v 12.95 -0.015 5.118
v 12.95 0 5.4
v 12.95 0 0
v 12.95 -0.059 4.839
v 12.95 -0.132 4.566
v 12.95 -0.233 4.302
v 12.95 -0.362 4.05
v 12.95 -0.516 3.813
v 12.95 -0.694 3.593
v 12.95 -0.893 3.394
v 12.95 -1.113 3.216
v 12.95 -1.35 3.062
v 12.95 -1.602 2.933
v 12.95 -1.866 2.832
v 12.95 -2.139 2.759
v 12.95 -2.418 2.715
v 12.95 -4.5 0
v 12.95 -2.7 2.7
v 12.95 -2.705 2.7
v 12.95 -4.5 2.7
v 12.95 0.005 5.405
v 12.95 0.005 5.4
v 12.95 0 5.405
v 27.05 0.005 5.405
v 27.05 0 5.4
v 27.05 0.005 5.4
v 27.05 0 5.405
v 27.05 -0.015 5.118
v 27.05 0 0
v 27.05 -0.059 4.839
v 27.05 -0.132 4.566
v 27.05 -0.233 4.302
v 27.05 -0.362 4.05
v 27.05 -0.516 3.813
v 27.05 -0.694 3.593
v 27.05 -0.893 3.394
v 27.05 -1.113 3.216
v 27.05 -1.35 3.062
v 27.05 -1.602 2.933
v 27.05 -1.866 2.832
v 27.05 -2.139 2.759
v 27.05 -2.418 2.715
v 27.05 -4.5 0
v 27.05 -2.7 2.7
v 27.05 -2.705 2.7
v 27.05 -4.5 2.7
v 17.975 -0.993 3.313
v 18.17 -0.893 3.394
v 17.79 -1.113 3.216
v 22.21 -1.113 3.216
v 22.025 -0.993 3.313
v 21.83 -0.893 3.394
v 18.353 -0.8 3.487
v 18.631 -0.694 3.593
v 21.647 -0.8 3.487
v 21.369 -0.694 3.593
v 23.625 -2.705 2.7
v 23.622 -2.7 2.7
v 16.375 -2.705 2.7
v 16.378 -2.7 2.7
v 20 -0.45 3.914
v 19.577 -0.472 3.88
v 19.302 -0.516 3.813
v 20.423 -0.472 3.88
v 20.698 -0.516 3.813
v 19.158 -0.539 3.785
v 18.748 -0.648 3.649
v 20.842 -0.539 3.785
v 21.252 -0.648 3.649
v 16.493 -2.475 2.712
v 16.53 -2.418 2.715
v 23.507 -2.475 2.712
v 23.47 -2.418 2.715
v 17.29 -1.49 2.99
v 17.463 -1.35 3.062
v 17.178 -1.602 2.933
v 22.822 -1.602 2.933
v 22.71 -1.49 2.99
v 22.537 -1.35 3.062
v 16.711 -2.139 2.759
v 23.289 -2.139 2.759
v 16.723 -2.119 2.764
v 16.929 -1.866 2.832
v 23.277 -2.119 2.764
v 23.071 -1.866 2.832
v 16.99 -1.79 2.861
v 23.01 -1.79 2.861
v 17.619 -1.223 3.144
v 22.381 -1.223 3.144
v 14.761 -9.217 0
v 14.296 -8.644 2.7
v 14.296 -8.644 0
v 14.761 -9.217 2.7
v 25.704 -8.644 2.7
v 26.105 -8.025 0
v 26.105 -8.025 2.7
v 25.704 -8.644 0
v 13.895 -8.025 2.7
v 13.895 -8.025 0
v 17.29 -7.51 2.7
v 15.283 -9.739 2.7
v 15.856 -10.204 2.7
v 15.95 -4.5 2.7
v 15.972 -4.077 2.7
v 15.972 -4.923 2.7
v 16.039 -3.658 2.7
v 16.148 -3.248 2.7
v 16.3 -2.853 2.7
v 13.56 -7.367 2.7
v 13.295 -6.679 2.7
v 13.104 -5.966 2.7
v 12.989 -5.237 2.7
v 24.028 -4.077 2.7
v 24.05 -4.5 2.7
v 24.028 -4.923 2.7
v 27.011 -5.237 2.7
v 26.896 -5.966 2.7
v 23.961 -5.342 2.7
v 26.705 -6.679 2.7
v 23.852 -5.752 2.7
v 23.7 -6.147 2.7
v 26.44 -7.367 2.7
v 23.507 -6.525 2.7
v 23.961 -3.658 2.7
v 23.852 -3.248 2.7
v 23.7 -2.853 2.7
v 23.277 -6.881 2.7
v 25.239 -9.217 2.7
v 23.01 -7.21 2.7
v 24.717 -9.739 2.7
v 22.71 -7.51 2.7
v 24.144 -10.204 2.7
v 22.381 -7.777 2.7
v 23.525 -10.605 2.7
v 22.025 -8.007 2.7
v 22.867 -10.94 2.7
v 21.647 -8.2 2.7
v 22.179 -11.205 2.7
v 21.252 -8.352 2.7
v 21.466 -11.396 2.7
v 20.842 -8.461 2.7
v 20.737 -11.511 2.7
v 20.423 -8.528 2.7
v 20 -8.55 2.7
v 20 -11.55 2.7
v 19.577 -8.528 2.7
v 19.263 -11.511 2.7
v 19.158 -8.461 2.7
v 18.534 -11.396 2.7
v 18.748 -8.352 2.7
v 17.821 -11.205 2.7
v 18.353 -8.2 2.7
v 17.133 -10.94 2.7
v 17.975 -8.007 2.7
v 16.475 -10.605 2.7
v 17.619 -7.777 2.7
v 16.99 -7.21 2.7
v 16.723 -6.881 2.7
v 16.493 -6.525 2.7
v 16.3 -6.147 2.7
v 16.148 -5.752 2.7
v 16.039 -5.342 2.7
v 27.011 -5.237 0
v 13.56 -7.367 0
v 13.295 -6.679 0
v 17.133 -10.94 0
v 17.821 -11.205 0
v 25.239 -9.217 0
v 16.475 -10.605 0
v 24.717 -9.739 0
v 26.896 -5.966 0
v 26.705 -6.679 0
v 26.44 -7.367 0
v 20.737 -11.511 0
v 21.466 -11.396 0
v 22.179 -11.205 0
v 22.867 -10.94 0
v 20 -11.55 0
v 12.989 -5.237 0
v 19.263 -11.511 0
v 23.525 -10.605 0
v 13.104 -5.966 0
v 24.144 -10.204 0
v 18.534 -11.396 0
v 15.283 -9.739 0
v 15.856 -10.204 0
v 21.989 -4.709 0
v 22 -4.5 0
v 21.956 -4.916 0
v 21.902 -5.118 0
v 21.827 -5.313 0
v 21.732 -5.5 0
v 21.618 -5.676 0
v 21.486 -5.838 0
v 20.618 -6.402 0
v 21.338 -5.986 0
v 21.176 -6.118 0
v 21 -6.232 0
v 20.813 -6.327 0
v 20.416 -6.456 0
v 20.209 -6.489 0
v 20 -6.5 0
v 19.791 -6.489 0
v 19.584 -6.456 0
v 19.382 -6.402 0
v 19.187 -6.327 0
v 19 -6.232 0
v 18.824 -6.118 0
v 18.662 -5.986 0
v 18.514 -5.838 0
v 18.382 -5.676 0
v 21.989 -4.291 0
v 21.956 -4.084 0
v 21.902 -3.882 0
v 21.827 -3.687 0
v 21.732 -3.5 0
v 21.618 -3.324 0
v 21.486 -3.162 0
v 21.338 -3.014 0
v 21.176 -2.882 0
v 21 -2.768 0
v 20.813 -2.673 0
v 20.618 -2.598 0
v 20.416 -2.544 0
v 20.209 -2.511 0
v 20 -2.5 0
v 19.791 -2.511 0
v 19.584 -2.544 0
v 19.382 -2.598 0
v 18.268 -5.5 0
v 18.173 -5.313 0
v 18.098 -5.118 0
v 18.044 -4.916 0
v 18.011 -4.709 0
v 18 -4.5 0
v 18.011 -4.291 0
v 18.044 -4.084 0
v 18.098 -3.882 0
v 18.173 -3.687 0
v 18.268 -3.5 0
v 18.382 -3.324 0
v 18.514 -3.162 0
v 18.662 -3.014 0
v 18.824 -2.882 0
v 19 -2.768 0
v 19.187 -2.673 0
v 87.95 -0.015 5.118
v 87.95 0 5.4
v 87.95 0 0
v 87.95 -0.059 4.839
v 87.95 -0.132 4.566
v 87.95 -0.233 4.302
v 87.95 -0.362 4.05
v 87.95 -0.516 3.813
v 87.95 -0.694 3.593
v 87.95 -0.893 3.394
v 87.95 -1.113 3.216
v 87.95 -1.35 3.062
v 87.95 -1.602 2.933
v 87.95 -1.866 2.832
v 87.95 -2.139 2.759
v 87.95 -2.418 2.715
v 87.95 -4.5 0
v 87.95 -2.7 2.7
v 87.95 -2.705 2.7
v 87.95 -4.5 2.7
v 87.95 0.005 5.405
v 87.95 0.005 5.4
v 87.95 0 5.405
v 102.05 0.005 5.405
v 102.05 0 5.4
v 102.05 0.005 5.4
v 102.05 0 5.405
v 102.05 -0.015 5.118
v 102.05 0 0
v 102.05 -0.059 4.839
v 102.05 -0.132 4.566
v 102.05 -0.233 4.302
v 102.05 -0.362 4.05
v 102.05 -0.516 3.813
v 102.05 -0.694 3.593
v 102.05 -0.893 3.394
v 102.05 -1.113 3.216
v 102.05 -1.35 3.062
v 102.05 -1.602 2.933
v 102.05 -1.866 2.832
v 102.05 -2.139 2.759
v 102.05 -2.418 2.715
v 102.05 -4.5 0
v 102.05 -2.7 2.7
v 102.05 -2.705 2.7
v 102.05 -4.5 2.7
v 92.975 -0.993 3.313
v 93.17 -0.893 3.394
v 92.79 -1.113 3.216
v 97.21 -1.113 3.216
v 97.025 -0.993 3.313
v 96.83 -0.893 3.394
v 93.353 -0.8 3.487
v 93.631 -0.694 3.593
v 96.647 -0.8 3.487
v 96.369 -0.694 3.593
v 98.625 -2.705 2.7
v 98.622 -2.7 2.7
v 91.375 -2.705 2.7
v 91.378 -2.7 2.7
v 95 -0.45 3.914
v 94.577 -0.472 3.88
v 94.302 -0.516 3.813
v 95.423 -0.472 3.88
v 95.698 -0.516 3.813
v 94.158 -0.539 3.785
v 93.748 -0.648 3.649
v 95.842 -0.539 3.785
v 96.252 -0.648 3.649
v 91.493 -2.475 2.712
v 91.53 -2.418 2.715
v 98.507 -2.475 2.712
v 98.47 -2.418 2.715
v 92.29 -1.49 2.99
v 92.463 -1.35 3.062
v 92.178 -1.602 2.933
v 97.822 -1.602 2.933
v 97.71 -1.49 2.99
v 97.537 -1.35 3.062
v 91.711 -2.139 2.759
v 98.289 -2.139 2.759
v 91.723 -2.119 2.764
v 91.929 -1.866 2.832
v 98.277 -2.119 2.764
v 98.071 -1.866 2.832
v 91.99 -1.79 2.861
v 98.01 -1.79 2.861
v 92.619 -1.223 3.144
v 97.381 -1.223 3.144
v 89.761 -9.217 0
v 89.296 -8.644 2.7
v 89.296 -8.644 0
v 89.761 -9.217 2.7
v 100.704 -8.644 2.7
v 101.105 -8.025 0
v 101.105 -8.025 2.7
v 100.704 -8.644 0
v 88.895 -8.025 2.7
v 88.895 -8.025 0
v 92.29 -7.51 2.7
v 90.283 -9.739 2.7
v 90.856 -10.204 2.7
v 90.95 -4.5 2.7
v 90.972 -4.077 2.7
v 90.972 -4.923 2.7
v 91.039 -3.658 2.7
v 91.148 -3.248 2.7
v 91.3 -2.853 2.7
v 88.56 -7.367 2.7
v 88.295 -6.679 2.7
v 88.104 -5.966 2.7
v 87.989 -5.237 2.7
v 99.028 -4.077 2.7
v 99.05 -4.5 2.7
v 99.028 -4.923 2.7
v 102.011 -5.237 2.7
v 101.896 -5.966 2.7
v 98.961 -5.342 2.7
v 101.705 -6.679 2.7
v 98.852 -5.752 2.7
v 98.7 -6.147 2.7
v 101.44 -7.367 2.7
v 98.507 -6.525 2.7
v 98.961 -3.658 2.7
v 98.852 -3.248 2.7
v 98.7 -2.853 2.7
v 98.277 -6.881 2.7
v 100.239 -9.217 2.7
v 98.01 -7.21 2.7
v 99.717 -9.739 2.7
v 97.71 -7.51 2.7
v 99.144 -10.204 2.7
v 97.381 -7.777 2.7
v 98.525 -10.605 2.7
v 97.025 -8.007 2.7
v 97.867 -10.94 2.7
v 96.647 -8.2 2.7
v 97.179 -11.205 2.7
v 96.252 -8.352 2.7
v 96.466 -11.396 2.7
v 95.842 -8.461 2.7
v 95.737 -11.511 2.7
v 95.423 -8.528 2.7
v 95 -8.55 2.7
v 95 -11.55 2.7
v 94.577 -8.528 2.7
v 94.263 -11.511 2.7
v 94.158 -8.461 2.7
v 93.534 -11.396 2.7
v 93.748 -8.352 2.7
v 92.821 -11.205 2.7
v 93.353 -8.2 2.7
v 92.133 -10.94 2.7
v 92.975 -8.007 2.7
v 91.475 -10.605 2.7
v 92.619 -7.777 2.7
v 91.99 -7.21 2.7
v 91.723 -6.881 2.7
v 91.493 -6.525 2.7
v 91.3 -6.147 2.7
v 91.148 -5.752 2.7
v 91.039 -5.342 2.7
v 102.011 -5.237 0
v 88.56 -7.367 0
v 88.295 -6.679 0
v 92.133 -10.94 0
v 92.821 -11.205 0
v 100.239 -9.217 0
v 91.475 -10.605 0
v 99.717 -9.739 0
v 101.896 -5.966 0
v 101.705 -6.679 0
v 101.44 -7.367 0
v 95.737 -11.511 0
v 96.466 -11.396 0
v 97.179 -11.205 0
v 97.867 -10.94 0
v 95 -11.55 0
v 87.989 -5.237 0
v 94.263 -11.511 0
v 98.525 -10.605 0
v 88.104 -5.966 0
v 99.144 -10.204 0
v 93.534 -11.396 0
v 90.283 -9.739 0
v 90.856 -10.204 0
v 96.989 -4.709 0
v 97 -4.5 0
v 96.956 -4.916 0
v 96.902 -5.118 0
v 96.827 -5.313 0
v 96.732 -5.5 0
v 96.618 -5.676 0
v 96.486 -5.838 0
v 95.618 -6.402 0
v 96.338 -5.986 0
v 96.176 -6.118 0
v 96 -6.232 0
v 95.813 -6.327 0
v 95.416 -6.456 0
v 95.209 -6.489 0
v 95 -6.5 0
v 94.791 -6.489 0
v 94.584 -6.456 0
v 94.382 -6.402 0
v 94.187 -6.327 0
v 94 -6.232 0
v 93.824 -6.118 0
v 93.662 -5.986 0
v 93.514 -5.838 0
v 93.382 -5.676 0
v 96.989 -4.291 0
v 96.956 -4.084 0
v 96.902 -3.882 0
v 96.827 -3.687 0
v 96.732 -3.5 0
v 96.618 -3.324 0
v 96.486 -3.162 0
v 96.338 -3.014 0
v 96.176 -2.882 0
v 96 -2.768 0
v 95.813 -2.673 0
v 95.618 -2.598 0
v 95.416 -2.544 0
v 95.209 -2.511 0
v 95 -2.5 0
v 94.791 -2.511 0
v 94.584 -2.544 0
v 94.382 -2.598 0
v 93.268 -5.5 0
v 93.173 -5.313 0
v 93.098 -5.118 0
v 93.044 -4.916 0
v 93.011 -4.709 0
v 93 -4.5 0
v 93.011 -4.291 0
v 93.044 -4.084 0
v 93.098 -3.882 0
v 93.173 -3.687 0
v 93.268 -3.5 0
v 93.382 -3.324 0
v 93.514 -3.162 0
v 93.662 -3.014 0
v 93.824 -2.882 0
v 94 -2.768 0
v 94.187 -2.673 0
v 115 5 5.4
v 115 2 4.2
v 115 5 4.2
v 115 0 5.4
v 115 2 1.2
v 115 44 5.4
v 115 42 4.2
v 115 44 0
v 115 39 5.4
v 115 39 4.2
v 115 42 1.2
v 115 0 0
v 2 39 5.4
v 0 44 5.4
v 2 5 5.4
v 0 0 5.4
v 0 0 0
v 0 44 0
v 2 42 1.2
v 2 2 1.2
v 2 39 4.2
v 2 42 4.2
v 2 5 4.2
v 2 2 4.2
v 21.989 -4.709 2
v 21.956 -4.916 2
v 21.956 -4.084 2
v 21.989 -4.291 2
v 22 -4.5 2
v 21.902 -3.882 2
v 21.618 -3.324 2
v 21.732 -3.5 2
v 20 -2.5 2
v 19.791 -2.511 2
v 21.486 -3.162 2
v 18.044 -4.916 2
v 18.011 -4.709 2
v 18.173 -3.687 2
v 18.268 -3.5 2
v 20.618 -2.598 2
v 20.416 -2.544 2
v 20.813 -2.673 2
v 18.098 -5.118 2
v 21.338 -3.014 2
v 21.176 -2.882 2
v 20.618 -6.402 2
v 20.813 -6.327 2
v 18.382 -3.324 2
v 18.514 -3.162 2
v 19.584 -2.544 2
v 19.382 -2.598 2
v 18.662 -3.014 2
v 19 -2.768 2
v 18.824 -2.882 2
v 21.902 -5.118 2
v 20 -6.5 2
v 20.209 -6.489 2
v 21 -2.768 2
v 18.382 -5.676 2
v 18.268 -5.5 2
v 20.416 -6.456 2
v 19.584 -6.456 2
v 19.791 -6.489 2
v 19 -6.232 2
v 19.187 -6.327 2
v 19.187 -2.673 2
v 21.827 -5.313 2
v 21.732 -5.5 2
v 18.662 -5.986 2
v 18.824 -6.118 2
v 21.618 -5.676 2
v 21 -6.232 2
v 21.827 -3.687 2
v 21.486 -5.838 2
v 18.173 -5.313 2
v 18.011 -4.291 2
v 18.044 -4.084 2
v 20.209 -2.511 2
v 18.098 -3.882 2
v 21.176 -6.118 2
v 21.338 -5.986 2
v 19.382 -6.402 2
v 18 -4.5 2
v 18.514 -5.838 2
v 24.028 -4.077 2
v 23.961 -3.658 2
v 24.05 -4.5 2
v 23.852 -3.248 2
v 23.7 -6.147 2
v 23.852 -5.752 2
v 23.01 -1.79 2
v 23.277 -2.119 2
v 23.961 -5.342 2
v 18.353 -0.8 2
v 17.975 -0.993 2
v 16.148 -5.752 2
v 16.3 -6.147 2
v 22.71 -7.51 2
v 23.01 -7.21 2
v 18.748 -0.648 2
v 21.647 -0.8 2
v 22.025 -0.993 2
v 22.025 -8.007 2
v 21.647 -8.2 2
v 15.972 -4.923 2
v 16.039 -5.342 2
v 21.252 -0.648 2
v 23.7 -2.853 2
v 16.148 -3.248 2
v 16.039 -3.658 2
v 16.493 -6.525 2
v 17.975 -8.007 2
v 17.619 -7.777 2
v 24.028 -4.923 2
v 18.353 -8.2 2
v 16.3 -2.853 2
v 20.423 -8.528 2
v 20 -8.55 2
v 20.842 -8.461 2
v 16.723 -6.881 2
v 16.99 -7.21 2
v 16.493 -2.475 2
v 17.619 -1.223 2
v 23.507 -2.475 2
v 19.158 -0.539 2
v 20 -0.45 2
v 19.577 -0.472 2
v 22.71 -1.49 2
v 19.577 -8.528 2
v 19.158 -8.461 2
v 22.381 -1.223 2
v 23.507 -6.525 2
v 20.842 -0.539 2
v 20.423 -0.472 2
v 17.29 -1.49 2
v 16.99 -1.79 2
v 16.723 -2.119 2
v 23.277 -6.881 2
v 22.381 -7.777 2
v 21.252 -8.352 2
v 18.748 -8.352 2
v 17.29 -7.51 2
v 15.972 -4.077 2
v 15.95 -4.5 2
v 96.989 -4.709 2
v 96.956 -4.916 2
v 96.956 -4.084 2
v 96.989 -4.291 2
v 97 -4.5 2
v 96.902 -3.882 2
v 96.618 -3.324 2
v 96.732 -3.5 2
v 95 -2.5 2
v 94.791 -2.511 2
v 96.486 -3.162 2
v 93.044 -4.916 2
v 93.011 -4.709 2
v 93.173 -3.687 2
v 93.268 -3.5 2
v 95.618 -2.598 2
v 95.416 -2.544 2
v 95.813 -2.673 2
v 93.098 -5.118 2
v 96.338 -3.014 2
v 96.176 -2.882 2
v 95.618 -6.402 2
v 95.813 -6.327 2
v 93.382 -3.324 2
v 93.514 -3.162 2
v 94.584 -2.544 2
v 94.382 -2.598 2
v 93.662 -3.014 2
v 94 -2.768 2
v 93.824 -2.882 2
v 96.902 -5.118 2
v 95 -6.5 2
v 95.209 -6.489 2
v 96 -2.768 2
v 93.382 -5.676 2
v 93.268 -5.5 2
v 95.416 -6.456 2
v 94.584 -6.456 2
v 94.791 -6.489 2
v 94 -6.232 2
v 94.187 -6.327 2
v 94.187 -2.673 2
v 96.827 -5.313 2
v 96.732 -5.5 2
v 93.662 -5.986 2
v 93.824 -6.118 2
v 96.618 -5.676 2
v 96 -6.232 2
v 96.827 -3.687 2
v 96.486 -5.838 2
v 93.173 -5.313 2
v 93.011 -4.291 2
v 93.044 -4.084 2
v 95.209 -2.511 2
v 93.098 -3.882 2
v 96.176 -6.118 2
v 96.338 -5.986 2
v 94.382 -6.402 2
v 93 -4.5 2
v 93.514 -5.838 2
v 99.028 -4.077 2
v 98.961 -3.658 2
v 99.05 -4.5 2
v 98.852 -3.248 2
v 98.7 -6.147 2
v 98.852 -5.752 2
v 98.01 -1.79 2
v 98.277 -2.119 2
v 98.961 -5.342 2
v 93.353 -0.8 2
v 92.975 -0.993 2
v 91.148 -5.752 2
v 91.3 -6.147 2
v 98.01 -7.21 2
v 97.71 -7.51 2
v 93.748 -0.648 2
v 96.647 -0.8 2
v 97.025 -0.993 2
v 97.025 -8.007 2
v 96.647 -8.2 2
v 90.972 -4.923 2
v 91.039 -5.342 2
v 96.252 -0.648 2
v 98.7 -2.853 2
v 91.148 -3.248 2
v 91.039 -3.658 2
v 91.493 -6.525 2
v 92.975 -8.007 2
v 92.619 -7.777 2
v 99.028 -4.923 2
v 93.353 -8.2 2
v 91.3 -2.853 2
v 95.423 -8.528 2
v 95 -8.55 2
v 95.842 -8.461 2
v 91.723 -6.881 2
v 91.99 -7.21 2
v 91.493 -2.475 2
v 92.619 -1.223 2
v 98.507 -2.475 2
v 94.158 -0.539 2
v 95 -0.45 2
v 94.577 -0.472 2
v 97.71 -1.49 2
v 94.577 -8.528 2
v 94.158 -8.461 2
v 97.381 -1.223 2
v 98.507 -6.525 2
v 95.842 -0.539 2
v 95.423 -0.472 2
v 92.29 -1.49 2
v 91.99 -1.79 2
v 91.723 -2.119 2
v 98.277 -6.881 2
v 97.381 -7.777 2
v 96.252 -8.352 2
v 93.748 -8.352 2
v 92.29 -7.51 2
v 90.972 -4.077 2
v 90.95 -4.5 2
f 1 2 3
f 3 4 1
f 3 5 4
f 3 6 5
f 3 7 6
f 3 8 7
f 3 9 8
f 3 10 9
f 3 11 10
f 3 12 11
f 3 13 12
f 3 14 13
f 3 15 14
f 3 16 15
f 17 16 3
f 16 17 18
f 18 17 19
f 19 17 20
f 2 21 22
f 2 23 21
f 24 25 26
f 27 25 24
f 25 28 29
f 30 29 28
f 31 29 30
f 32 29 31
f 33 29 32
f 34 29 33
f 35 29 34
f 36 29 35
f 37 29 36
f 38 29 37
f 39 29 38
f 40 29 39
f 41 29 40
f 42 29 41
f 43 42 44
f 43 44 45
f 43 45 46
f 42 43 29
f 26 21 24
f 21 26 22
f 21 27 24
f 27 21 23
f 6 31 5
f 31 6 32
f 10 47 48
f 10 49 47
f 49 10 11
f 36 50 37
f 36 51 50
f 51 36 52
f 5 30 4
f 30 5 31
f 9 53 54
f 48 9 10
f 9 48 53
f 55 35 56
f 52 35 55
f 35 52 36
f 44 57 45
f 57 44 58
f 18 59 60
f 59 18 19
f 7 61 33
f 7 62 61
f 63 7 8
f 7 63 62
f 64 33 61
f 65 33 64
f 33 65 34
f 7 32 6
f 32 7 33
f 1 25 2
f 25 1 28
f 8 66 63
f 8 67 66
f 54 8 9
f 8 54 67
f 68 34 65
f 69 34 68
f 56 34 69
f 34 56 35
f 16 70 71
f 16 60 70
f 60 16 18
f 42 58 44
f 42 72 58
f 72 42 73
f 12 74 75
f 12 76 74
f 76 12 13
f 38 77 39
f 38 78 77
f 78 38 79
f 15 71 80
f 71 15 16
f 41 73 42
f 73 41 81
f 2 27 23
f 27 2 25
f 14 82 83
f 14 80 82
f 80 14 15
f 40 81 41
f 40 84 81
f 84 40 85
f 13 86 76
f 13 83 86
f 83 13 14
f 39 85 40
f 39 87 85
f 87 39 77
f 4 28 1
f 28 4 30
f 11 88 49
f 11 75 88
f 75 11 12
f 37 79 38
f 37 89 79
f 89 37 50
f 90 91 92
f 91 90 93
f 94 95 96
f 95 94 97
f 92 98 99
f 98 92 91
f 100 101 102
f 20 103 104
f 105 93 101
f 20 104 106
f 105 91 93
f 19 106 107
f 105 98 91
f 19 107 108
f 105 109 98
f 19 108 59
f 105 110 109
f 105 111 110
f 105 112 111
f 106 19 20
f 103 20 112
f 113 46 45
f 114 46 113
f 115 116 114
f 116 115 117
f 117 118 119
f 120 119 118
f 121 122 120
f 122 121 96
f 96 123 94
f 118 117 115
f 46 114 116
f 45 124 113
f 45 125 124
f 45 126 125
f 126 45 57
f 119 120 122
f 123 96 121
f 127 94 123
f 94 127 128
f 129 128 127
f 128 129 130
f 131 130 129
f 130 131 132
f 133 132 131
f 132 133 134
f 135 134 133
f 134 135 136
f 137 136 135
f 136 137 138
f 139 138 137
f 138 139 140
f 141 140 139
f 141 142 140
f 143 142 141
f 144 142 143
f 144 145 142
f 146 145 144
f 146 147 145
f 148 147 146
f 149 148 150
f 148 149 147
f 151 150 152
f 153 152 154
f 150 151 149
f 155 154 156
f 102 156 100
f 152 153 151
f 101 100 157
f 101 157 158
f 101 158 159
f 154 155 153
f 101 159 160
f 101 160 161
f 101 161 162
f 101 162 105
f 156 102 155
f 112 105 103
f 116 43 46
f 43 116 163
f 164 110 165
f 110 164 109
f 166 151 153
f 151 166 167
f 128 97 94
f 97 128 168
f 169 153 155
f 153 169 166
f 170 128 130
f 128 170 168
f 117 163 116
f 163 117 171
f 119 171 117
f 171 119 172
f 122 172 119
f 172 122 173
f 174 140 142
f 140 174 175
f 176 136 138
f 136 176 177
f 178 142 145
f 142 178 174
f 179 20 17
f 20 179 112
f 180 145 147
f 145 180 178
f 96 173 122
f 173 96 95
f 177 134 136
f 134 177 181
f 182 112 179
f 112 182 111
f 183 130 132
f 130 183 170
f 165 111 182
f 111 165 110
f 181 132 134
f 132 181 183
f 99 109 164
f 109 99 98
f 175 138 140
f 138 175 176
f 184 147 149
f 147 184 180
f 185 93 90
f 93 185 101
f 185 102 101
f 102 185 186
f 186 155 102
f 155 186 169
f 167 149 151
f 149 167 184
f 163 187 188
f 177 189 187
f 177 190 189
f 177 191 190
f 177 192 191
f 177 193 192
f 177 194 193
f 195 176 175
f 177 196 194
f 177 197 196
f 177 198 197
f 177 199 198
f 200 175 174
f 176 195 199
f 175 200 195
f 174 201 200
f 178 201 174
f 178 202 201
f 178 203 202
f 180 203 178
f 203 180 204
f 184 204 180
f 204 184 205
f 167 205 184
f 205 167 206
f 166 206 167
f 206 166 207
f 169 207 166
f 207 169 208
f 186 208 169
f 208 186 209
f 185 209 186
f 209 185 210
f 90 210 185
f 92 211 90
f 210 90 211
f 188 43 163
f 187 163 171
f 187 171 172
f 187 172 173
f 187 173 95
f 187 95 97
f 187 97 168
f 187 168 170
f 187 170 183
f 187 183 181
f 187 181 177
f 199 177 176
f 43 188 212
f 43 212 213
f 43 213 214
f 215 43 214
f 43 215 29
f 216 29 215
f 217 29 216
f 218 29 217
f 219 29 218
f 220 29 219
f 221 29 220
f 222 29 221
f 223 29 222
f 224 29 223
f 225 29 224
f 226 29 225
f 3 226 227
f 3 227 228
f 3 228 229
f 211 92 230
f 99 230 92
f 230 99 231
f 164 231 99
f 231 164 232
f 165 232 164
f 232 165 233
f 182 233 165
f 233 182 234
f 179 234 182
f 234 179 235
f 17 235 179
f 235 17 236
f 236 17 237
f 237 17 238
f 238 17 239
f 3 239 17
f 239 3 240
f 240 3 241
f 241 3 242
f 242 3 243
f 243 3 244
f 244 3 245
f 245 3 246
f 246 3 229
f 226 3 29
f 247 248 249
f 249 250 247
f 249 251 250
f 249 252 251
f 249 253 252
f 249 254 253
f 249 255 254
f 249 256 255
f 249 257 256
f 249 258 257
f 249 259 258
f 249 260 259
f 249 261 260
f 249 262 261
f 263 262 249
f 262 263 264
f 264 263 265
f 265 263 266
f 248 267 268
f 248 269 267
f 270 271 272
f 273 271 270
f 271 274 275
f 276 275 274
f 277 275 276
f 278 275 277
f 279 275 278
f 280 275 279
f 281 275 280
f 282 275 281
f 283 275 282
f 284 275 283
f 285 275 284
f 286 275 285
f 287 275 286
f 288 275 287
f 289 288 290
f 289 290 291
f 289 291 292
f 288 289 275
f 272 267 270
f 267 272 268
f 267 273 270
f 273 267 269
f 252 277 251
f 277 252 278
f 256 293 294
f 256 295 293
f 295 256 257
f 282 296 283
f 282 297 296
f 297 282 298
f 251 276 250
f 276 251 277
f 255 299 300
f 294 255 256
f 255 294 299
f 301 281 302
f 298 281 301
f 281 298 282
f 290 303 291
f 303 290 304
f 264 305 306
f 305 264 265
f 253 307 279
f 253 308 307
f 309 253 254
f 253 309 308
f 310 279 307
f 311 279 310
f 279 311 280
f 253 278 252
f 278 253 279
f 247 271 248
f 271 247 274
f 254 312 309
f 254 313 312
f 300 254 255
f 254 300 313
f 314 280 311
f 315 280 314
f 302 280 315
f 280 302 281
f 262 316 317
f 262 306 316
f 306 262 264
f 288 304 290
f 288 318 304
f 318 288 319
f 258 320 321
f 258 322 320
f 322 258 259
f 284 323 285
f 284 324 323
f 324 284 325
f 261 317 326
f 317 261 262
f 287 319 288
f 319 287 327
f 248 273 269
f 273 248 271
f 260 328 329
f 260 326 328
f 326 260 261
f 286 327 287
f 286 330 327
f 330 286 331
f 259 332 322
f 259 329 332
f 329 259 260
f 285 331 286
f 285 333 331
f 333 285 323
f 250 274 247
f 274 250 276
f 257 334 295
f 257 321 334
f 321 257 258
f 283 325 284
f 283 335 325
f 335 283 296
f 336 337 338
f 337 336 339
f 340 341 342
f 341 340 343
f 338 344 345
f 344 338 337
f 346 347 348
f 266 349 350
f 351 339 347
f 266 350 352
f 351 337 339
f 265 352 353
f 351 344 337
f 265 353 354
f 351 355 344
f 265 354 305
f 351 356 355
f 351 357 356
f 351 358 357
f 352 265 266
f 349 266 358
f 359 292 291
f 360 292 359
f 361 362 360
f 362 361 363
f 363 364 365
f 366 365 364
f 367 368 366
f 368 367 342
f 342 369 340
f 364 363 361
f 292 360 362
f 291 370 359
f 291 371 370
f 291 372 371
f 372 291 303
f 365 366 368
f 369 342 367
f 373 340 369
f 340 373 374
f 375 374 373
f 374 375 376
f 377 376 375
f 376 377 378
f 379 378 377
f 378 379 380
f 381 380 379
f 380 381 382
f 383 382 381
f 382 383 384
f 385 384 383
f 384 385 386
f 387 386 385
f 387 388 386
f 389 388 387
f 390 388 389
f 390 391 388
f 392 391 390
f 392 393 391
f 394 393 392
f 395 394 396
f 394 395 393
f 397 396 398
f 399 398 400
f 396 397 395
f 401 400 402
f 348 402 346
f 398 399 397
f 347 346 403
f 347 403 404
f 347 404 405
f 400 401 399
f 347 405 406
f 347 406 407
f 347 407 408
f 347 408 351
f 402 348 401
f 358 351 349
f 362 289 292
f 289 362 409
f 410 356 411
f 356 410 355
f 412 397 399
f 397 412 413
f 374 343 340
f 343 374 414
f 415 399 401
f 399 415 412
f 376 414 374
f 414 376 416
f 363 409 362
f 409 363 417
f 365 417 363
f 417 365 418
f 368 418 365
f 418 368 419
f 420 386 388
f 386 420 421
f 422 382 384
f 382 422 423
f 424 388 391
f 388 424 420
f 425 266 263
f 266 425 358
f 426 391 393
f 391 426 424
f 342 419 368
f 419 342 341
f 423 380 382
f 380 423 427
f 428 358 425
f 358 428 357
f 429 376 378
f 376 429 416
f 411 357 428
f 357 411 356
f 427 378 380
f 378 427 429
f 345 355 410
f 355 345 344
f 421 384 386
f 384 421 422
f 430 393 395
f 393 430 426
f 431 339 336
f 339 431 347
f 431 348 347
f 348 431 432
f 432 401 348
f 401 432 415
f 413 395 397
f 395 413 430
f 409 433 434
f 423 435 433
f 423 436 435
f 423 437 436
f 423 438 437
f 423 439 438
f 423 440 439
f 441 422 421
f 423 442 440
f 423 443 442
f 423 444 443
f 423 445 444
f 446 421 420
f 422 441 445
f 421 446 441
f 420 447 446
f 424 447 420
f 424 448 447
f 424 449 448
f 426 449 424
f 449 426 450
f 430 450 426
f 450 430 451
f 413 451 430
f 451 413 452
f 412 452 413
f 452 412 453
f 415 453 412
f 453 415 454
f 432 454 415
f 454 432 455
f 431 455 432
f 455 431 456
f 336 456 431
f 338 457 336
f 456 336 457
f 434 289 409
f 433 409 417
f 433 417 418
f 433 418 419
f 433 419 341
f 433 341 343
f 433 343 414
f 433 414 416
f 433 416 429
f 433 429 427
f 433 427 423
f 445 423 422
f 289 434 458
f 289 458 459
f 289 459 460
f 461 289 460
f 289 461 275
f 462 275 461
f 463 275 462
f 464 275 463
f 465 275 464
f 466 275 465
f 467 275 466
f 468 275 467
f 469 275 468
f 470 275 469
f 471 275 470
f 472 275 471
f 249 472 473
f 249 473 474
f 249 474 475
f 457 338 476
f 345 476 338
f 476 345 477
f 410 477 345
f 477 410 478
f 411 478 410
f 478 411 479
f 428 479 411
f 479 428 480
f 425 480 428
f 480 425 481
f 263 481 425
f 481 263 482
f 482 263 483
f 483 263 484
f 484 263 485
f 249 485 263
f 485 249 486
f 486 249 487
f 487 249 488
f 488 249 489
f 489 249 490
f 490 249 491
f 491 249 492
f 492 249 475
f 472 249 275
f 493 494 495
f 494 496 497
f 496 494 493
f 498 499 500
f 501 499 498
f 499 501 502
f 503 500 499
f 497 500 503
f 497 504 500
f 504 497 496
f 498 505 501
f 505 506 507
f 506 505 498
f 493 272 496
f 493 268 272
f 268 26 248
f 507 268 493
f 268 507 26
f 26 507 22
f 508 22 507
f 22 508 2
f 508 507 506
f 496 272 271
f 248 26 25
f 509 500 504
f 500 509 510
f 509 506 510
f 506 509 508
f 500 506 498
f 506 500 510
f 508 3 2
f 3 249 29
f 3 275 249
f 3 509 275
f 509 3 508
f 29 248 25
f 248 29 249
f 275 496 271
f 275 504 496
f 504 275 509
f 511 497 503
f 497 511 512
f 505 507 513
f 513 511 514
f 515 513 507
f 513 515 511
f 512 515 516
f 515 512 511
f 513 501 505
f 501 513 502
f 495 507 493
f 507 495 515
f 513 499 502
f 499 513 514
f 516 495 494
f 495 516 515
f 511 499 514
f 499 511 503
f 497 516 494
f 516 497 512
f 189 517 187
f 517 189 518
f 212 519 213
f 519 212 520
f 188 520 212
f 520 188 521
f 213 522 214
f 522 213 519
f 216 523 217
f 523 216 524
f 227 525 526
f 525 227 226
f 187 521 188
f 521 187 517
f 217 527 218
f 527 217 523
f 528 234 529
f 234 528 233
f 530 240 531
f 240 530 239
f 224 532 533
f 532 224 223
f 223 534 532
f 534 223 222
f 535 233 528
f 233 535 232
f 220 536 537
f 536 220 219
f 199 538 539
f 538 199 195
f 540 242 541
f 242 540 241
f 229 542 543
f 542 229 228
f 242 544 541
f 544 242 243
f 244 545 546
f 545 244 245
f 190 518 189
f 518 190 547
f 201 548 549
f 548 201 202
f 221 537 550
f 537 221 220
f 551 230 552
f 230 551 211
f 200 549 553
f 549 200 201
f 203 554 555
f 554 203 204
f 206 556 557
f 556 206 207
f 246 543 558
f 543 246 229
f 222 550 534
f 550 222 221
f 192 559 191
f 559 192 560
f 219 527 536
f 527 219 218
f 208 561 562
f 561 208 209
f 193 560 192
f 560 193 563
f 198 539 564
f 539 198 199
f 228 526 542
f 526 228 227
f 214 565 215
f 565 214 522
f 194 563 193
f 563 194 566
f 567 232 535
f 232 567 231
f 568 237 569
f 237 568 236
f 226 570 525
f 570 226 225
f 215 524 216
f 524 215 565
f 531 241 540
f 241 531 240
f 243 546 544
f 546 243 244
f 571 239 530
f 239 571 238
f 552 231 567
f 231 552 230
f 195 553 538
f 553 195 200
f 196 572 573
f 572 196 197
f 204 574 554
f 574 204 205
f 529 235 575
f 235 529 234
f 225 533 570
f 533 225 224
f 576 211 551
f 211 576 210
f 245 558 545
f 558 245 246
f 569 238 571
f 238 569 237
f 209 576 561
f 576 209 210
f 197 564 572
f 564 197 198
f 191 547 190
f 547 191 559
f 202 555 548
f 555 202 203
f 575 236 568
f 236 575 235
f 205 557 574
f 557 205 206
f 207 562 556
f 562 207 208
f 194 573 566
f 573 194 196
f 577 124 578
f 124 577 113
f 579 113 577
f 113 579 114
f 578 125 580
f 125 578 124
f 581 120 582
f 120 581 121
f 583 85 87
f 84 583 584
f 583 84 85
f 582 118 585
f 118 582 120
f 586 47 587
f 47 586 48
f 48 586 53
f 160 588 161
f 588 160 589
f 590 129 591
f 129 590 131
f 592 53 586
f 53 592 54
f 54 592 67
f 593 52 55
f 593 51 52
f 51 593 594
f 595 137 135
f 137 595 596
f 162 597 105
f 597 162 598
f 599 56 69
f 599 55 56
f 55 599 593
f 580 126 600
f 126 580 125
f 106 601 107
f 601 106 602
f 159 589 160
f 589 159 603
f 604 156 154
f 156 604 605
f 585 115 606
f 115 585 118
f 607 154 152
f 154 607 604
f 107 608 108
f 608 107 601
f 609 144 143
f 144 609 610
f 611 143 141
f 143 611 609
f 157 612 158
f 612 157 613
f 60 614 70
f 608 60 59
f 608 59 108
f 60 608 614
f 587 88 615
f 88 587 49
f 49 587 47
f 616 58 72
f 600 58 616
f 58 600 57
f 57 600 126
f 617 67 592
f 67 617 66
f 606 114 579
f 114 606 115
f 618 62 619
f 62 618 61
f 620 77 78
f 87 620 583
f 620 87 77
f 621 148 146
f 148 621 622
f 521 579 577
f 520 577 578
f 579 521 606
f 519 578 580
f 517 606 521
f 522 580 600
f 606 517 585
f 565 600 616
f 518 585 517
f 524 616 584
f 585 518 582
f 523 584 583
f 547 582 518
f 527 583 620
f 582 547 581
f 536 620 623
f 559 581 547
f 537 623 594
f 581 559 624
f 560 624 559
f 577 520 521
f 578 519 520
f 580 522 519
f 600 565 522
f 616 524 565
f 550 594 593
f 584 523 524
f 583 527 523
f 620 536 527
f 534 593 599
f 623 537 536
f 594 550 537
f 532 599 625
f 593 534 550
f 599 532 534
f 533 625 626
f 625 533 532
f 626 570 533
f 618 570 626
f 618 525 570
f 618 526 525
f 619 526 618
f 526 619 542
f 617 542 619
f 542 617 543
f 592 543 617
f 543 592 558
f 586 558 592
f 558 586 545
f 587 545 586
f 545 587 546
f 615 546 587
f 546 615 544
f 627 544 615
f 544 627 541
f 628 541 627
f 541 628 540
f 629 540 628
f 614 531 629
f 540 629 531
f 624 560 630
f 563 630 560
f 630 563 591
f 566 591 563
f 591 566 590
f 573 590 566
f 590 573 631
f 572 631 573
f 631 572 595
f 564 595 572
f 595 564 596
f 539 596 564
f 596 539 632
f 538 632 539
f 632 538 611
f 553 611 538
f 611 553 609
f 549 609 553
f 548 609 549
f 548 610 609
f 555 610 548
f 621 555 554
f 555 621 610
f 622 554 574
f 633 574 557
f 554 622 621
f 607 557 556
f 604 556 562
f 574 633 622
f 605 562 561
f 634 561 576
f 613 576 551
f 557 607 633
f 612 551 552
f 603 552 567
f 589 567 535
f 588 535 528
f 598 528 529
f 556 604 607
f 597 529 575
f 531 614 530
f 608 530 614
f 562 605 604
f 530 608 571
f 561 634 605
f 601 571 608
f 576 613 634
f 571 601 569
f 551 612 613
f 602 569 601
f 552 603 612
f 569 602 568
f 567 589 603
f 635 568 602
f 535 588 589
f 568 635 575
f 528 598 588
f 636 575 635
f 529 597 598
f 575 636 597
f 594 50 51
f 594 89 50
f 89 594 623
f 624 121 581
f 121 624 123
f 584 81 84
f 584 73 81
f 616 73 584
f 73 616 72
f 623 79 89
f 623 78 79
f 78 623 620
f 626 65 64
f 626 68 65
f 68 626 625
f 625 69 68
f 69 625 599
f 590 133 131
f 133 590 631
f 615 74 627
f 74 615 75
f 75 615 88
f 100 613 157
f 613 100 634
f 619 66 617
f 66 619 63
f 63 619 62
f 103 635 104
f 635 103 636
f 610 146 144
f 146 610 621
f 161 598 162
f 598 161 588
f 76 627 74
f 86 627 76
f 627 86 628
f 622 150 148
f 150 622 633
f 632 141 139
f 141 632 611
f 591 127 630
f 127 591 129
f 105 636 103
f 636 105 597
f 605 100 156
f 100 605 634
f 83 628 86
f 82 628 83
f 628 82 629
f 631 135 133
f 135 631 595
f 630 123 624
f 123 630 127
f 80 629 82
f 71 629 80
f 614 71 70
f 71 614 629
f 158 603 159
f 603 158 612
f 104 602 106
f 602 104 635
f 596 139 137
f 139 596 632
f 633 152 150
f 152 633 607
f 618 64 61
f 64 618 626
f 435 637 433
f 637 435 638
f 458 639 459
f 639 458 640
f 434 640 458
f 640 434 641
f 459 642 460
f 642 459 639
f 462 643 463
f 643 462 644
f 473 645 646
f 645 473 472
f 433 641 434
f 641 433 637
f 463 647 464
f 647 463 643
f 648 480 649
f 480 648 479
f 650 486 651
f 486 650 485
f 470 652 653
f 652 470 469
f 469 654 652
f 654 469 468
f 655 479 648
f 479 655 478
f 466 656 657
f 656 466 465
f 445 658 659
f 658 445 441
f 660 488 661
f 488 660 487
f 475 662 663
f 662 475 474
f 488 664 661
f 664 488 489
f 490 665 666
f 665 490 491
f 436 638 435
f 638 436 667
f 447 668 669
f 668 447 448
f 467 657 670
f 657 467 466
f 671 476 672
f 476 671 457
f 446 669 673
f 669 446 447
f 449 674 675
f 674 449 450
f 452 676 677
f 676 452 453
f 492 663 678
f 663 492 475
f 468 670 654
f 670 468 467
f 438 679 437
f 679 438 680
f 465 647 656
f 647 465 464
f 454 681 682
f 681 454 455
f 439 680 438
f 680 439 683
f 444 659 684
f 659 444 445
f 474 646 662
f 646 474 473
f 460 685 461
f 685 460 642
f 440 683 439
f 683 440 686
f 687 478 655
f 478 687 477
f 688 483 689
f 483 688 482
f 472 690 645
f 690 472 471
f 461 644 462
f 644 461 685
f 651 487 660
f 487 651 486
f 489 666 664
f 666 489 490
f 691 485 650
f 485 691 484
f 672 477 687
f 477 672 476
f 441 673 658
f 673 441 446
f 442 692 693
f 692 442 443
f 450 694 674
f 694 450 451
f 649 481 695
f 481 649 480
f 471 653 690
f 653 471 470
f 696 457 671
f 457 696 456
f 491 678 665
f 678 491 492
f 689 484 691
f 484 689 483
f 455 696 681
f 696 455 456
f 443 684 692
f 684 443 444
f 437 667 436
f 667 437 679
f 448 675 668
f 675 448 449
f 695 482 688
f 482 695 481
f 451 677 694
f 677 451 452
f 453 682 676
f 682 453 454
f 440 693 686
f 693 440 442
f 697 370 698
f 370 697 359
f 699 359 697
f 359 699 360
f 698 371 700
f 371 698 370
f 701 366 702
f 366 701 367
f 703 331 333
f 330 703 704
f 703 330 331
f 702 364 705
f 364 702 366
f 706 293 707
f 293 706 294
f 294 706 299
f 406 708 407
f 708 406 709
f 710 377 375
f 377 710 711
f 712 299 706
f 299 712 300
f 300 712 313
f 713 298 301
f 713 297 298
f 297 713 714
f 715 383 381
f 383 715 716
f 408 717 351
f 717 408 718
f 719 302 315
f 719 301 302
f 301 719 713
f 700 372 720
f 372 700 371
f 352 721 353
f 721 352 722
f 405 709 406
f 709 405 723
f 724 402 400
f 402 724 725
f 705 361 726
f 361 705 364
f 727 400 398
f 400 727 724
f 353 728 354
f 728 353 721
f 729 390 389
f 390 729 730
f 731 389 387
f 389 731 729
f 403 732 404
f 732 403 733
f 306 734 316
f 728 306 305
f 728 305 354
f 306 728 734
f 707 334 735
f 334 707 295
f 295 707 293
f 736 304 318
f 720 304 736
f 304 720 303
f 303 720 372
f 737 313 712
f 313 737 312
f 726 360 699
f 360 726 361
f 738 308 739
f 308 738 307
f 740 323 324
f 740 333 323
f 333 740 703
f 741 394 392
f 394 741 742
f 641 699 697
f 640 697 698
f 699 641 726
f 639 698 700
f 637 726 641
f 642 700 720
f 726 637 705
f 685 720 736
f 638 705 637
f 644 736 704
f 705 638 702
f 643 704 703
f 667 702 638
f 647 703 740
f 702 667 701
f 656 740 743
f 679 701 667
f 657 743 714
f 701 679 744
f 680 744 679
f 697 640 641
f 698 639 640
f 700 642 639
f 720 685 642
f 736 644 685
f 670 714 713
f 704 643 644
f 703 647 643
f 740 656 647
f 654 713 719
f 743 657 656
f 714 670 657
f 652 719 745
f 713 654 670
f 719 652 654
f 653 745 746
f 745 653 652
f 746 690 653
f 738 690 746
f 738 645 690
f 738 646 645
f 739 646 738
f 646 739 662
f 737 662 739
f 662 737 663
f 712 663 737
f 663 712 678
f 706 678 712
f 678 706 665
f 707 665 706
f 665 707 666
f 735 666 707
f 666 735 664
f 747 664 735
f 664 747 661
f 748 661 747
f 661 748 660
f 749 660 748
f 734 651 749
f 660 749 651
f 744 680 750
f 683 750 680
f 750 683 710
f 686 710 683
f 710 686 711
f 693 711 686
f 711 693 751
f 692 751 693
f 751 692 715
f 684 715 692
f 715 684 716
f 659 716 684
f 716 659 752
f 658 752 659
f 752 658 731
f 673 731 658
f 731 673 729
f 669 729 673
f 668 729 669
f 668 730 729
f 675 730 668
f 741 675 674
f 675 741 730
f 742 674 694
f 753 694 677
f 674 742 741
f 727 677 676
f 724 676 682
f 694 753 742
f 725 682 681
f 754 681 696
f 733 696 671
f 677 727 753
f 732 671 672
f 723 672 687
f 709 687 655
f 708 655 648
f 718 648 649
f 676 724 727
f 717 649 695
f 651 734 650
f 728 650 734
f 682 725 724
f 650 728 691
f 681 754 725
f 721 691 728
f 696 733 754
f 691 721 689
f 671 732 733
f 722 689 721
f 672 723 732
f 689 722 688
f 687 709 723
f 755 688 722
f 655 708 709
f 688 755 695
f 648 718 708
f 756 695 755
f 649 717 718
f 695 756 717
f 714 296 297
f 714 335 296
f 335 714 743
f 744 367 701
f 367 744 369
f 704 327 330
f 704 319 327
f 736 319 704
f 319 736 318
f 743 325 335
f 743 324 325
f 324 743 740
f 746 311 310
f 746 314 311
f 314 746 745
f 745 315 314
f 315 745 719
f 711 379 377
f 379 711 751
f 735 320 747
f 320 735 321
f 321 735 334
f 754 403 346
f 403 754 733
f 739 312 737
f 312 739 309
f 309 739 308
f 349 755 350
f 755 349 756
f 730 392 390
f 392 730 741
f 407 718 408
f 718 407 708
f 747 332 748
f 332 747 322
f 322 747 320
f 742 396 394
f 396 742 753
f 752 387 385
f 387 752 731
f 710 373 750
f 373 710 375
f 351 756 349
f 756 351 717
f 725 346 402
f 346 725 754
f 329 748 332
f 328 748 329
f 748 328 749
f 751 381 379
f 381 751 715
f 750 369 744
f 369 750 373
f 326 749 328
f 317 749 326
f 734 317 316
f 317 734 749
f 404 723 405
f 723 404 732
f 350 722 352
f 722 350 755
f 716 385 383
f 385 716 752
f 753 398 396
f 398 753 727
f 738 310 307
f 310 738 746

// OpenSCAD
// MIT licence copywrite jim dodgen 2021, 2025 
// wine celler tag holder:
// two mounts vertical and horizontal also a template for cutting out tags
//
$fn=60;

holeD=4;
recessD=8.1;

base = 200;
width = sqrt(base*base/2);
//thickness = 5;

slot_width = 110;  // for 4.25 inch paper (2 across per sheet) see template for cutting guide
slot_height = 40;  // for 1.5  inch
silly_slot_height = 300;  // very big
silly_slot_width = 150;  // very big
flat_width = slot_width+5;
additional_for_width_flat = 4;
flat_height = slot_height+additional_for_width_flat;
paper_slot_thickness = 3;
thickness = paper_slot_thickness+2.4;
paper_slot_offset = (thickness - paper_slot_thickness)/2;
tab_y_offset = -4.5;

// two styles, horz or vertical
// tilt_cube  makes a mount for tilted cube wine racks 
// tilt_cube(1); // 0 for top 1 for bottom mounting
flat(1);

//template();  // use to cut out tags

module template() {
    difference()
    {
        cube([slot_height+20,slot_width+20,2], center=true);
        cube([slot_height-1,slot_width-0.4,2], center=true);
    } 
}

module flat(flip) {
    difference() {
        union() {
            cube([flat_width, flat_height ,thickness]);
            if (flip == 1) {
                translate([20,0,0]) tab(0,tab_y_offset);
                translate([flat_width-20,0,0]) tab(0,tab_y_offset);                          
            } else {
                translate([20,0,0])  tab(180,(tab_y_offset*-1)+flat_height);
                translate([flat_width-20,0,0])  tab(180,(tab_y_offset*-1)+flat_height);     
            }            
        }
        translate([(slot_width+10)/2+(additional_for_width_flat/2), additional_for_width_flat/2, paper_slot_offset]) slot(slot_height, slot_width+10);        
        // drill holes  
        if (flip == 1) {
            translate([20,tab_y_offset,0]) hole();
            translate([flat_width-20,tab_y_offset,0]) hole();
        } else {
            translate([20,(tab_y_offset*-1)+flat_height,0]) rotate([0,0,180]) hole();
            translate([flat_width-20,(tab_y_offset*-1)+flat_height,0]) hole();     
        } 
    }

}


module tilt_cube(flip) {
    difference() {
        translate([0,-(base/2),0]) rotate([0,0,45]) cube([width,width,thickness]);
        translate([-(base/2),-base,0]) cube([base,base,thickness]);
        translate([-(base/2),(base/2)-57,0]) cube([base,base,thickness]);
        if (flip == 1)
        {
           translate([0,-silly_slot_height+40,paper_slot_thickness])tilt_slot(silly_slot_height, slot_width);
        }
        else
        {
           translate([0,4,paper_slot_offset])tilt_slot(silly_slot_height, slot_width);
        }

        from_edge = 35;
        up = 28;
        translate([(base/2)-from_edge,up,0]) hole();
        translate([-(base/2)+from_edge,up,0]) hole();

        fillet_offset = 60;
        edge_offset = fillet_offset+22;

        translate([fillet_offset,0,-1]) fillet(90, 22, thickness+2);
        translate([edge_offset,0,0]) cube([base,base,thickness]);

        translate([-(base/2)+18,0,-1]) fillet(0, 22, thickness+2);
        translate([-edge_offset-base,0,0]) cube([base,base,thickness]);
    }
}

module slot(height, width, center=true) {
    union() {
        tab=6;
        translate([0,height/2,(paper_slot_thickness*4/2)]) cube([width, height-tab, paper_slot_thickness*4], center = center);
        translate([0,height/2,paper_slot_thickness/2]) cube([width, height, paper_slot_thickness], center = center);
    }
}

module tilt_slot(height, width) {
    union() {
        tab=6;
        translate([0,height/2,(paper_slot_thickness*4/2)]) cube([width-tab, height-tab, paper_slot_thickness*4], center = true);
        translate([0,height/2,paper_slot_thickness/2]) cube([width, height, paper_slot_thickness], center = true);
    }
}

pop_up = thickness/2;
module hole() {

translate([0,0,pop_up]) cylinder(d = holeD, h = thickness, center = true);
translate([0,0,pop_up + 2]) cylinder(d = recessD, h = thickness, center = true);

}

module fillet(rot, r, h) {
    translate([r / 2, r / 2, h/2])
    rotate([0,0,rot]) difference() {
        cube([r + 0.01, r + 0.01, h], center = true);
        translate([r/2, r/2, 0])
            cylinder(r = r, h = h + 1, center = true);
    }
}
//tab(0, tab_y_offset);
module tab (degrees, Yoffset) {
    radi = thickness-pop_up;
    tabD = recessD+6;
    fillet_offset = degrees ? Yoffset - flat_height - radi : -Yoffset - radi;
    translate([0,Yoffset,0]) {
        rotate([0,0,degrees]) {
            translate([0,0,pop_up/2]) {
                cylinder(d = tabD, h = pop_up, center = true); 
                translate([0,tabD/2,0]) cube([tabD,tabD, pop_up], , center = true);
                translate([tabD/2,fillet_offset, pop_up/2])  rotate([0,-90,0]) fillet(-90, radi, tabD);
                //translate([tabD/2,-(Yoffset/2)-.5, pop_up/2])  rotate([0,-90,0]) fillet(-90, radi, tabD);

            }
        }
    }
}

module tilt_tab (degrees, Yoffset) {
    radi = thickness-pop_up;
    tabD = recessD+6;
    fillet_offset = degrees ? Yoffset - (flat_height+10) - radi : -Yoffset - radi;
    translate([0,Yoffset,0]) {
        rotate([0,0,degrees]) {
            translate([0,0,pop_up/2]) {
                cylinder(d = tabD, h = pop_up, center = true); 
                translate([0,tabD/2,0]) cube([tabD,tabD, pop_up], , center = true);
                translate([tabD/2,fillet_offset, pop_up/2])  rotate([0,-90,0]) fillet(-90, radi, tabD);
                //translate([tabD/2,-(Yoffset/2)-.5, pop_up/2])  rotate([0,-90,0]) fillet(-90, radi, tabD);

            }
        }
    }
}
